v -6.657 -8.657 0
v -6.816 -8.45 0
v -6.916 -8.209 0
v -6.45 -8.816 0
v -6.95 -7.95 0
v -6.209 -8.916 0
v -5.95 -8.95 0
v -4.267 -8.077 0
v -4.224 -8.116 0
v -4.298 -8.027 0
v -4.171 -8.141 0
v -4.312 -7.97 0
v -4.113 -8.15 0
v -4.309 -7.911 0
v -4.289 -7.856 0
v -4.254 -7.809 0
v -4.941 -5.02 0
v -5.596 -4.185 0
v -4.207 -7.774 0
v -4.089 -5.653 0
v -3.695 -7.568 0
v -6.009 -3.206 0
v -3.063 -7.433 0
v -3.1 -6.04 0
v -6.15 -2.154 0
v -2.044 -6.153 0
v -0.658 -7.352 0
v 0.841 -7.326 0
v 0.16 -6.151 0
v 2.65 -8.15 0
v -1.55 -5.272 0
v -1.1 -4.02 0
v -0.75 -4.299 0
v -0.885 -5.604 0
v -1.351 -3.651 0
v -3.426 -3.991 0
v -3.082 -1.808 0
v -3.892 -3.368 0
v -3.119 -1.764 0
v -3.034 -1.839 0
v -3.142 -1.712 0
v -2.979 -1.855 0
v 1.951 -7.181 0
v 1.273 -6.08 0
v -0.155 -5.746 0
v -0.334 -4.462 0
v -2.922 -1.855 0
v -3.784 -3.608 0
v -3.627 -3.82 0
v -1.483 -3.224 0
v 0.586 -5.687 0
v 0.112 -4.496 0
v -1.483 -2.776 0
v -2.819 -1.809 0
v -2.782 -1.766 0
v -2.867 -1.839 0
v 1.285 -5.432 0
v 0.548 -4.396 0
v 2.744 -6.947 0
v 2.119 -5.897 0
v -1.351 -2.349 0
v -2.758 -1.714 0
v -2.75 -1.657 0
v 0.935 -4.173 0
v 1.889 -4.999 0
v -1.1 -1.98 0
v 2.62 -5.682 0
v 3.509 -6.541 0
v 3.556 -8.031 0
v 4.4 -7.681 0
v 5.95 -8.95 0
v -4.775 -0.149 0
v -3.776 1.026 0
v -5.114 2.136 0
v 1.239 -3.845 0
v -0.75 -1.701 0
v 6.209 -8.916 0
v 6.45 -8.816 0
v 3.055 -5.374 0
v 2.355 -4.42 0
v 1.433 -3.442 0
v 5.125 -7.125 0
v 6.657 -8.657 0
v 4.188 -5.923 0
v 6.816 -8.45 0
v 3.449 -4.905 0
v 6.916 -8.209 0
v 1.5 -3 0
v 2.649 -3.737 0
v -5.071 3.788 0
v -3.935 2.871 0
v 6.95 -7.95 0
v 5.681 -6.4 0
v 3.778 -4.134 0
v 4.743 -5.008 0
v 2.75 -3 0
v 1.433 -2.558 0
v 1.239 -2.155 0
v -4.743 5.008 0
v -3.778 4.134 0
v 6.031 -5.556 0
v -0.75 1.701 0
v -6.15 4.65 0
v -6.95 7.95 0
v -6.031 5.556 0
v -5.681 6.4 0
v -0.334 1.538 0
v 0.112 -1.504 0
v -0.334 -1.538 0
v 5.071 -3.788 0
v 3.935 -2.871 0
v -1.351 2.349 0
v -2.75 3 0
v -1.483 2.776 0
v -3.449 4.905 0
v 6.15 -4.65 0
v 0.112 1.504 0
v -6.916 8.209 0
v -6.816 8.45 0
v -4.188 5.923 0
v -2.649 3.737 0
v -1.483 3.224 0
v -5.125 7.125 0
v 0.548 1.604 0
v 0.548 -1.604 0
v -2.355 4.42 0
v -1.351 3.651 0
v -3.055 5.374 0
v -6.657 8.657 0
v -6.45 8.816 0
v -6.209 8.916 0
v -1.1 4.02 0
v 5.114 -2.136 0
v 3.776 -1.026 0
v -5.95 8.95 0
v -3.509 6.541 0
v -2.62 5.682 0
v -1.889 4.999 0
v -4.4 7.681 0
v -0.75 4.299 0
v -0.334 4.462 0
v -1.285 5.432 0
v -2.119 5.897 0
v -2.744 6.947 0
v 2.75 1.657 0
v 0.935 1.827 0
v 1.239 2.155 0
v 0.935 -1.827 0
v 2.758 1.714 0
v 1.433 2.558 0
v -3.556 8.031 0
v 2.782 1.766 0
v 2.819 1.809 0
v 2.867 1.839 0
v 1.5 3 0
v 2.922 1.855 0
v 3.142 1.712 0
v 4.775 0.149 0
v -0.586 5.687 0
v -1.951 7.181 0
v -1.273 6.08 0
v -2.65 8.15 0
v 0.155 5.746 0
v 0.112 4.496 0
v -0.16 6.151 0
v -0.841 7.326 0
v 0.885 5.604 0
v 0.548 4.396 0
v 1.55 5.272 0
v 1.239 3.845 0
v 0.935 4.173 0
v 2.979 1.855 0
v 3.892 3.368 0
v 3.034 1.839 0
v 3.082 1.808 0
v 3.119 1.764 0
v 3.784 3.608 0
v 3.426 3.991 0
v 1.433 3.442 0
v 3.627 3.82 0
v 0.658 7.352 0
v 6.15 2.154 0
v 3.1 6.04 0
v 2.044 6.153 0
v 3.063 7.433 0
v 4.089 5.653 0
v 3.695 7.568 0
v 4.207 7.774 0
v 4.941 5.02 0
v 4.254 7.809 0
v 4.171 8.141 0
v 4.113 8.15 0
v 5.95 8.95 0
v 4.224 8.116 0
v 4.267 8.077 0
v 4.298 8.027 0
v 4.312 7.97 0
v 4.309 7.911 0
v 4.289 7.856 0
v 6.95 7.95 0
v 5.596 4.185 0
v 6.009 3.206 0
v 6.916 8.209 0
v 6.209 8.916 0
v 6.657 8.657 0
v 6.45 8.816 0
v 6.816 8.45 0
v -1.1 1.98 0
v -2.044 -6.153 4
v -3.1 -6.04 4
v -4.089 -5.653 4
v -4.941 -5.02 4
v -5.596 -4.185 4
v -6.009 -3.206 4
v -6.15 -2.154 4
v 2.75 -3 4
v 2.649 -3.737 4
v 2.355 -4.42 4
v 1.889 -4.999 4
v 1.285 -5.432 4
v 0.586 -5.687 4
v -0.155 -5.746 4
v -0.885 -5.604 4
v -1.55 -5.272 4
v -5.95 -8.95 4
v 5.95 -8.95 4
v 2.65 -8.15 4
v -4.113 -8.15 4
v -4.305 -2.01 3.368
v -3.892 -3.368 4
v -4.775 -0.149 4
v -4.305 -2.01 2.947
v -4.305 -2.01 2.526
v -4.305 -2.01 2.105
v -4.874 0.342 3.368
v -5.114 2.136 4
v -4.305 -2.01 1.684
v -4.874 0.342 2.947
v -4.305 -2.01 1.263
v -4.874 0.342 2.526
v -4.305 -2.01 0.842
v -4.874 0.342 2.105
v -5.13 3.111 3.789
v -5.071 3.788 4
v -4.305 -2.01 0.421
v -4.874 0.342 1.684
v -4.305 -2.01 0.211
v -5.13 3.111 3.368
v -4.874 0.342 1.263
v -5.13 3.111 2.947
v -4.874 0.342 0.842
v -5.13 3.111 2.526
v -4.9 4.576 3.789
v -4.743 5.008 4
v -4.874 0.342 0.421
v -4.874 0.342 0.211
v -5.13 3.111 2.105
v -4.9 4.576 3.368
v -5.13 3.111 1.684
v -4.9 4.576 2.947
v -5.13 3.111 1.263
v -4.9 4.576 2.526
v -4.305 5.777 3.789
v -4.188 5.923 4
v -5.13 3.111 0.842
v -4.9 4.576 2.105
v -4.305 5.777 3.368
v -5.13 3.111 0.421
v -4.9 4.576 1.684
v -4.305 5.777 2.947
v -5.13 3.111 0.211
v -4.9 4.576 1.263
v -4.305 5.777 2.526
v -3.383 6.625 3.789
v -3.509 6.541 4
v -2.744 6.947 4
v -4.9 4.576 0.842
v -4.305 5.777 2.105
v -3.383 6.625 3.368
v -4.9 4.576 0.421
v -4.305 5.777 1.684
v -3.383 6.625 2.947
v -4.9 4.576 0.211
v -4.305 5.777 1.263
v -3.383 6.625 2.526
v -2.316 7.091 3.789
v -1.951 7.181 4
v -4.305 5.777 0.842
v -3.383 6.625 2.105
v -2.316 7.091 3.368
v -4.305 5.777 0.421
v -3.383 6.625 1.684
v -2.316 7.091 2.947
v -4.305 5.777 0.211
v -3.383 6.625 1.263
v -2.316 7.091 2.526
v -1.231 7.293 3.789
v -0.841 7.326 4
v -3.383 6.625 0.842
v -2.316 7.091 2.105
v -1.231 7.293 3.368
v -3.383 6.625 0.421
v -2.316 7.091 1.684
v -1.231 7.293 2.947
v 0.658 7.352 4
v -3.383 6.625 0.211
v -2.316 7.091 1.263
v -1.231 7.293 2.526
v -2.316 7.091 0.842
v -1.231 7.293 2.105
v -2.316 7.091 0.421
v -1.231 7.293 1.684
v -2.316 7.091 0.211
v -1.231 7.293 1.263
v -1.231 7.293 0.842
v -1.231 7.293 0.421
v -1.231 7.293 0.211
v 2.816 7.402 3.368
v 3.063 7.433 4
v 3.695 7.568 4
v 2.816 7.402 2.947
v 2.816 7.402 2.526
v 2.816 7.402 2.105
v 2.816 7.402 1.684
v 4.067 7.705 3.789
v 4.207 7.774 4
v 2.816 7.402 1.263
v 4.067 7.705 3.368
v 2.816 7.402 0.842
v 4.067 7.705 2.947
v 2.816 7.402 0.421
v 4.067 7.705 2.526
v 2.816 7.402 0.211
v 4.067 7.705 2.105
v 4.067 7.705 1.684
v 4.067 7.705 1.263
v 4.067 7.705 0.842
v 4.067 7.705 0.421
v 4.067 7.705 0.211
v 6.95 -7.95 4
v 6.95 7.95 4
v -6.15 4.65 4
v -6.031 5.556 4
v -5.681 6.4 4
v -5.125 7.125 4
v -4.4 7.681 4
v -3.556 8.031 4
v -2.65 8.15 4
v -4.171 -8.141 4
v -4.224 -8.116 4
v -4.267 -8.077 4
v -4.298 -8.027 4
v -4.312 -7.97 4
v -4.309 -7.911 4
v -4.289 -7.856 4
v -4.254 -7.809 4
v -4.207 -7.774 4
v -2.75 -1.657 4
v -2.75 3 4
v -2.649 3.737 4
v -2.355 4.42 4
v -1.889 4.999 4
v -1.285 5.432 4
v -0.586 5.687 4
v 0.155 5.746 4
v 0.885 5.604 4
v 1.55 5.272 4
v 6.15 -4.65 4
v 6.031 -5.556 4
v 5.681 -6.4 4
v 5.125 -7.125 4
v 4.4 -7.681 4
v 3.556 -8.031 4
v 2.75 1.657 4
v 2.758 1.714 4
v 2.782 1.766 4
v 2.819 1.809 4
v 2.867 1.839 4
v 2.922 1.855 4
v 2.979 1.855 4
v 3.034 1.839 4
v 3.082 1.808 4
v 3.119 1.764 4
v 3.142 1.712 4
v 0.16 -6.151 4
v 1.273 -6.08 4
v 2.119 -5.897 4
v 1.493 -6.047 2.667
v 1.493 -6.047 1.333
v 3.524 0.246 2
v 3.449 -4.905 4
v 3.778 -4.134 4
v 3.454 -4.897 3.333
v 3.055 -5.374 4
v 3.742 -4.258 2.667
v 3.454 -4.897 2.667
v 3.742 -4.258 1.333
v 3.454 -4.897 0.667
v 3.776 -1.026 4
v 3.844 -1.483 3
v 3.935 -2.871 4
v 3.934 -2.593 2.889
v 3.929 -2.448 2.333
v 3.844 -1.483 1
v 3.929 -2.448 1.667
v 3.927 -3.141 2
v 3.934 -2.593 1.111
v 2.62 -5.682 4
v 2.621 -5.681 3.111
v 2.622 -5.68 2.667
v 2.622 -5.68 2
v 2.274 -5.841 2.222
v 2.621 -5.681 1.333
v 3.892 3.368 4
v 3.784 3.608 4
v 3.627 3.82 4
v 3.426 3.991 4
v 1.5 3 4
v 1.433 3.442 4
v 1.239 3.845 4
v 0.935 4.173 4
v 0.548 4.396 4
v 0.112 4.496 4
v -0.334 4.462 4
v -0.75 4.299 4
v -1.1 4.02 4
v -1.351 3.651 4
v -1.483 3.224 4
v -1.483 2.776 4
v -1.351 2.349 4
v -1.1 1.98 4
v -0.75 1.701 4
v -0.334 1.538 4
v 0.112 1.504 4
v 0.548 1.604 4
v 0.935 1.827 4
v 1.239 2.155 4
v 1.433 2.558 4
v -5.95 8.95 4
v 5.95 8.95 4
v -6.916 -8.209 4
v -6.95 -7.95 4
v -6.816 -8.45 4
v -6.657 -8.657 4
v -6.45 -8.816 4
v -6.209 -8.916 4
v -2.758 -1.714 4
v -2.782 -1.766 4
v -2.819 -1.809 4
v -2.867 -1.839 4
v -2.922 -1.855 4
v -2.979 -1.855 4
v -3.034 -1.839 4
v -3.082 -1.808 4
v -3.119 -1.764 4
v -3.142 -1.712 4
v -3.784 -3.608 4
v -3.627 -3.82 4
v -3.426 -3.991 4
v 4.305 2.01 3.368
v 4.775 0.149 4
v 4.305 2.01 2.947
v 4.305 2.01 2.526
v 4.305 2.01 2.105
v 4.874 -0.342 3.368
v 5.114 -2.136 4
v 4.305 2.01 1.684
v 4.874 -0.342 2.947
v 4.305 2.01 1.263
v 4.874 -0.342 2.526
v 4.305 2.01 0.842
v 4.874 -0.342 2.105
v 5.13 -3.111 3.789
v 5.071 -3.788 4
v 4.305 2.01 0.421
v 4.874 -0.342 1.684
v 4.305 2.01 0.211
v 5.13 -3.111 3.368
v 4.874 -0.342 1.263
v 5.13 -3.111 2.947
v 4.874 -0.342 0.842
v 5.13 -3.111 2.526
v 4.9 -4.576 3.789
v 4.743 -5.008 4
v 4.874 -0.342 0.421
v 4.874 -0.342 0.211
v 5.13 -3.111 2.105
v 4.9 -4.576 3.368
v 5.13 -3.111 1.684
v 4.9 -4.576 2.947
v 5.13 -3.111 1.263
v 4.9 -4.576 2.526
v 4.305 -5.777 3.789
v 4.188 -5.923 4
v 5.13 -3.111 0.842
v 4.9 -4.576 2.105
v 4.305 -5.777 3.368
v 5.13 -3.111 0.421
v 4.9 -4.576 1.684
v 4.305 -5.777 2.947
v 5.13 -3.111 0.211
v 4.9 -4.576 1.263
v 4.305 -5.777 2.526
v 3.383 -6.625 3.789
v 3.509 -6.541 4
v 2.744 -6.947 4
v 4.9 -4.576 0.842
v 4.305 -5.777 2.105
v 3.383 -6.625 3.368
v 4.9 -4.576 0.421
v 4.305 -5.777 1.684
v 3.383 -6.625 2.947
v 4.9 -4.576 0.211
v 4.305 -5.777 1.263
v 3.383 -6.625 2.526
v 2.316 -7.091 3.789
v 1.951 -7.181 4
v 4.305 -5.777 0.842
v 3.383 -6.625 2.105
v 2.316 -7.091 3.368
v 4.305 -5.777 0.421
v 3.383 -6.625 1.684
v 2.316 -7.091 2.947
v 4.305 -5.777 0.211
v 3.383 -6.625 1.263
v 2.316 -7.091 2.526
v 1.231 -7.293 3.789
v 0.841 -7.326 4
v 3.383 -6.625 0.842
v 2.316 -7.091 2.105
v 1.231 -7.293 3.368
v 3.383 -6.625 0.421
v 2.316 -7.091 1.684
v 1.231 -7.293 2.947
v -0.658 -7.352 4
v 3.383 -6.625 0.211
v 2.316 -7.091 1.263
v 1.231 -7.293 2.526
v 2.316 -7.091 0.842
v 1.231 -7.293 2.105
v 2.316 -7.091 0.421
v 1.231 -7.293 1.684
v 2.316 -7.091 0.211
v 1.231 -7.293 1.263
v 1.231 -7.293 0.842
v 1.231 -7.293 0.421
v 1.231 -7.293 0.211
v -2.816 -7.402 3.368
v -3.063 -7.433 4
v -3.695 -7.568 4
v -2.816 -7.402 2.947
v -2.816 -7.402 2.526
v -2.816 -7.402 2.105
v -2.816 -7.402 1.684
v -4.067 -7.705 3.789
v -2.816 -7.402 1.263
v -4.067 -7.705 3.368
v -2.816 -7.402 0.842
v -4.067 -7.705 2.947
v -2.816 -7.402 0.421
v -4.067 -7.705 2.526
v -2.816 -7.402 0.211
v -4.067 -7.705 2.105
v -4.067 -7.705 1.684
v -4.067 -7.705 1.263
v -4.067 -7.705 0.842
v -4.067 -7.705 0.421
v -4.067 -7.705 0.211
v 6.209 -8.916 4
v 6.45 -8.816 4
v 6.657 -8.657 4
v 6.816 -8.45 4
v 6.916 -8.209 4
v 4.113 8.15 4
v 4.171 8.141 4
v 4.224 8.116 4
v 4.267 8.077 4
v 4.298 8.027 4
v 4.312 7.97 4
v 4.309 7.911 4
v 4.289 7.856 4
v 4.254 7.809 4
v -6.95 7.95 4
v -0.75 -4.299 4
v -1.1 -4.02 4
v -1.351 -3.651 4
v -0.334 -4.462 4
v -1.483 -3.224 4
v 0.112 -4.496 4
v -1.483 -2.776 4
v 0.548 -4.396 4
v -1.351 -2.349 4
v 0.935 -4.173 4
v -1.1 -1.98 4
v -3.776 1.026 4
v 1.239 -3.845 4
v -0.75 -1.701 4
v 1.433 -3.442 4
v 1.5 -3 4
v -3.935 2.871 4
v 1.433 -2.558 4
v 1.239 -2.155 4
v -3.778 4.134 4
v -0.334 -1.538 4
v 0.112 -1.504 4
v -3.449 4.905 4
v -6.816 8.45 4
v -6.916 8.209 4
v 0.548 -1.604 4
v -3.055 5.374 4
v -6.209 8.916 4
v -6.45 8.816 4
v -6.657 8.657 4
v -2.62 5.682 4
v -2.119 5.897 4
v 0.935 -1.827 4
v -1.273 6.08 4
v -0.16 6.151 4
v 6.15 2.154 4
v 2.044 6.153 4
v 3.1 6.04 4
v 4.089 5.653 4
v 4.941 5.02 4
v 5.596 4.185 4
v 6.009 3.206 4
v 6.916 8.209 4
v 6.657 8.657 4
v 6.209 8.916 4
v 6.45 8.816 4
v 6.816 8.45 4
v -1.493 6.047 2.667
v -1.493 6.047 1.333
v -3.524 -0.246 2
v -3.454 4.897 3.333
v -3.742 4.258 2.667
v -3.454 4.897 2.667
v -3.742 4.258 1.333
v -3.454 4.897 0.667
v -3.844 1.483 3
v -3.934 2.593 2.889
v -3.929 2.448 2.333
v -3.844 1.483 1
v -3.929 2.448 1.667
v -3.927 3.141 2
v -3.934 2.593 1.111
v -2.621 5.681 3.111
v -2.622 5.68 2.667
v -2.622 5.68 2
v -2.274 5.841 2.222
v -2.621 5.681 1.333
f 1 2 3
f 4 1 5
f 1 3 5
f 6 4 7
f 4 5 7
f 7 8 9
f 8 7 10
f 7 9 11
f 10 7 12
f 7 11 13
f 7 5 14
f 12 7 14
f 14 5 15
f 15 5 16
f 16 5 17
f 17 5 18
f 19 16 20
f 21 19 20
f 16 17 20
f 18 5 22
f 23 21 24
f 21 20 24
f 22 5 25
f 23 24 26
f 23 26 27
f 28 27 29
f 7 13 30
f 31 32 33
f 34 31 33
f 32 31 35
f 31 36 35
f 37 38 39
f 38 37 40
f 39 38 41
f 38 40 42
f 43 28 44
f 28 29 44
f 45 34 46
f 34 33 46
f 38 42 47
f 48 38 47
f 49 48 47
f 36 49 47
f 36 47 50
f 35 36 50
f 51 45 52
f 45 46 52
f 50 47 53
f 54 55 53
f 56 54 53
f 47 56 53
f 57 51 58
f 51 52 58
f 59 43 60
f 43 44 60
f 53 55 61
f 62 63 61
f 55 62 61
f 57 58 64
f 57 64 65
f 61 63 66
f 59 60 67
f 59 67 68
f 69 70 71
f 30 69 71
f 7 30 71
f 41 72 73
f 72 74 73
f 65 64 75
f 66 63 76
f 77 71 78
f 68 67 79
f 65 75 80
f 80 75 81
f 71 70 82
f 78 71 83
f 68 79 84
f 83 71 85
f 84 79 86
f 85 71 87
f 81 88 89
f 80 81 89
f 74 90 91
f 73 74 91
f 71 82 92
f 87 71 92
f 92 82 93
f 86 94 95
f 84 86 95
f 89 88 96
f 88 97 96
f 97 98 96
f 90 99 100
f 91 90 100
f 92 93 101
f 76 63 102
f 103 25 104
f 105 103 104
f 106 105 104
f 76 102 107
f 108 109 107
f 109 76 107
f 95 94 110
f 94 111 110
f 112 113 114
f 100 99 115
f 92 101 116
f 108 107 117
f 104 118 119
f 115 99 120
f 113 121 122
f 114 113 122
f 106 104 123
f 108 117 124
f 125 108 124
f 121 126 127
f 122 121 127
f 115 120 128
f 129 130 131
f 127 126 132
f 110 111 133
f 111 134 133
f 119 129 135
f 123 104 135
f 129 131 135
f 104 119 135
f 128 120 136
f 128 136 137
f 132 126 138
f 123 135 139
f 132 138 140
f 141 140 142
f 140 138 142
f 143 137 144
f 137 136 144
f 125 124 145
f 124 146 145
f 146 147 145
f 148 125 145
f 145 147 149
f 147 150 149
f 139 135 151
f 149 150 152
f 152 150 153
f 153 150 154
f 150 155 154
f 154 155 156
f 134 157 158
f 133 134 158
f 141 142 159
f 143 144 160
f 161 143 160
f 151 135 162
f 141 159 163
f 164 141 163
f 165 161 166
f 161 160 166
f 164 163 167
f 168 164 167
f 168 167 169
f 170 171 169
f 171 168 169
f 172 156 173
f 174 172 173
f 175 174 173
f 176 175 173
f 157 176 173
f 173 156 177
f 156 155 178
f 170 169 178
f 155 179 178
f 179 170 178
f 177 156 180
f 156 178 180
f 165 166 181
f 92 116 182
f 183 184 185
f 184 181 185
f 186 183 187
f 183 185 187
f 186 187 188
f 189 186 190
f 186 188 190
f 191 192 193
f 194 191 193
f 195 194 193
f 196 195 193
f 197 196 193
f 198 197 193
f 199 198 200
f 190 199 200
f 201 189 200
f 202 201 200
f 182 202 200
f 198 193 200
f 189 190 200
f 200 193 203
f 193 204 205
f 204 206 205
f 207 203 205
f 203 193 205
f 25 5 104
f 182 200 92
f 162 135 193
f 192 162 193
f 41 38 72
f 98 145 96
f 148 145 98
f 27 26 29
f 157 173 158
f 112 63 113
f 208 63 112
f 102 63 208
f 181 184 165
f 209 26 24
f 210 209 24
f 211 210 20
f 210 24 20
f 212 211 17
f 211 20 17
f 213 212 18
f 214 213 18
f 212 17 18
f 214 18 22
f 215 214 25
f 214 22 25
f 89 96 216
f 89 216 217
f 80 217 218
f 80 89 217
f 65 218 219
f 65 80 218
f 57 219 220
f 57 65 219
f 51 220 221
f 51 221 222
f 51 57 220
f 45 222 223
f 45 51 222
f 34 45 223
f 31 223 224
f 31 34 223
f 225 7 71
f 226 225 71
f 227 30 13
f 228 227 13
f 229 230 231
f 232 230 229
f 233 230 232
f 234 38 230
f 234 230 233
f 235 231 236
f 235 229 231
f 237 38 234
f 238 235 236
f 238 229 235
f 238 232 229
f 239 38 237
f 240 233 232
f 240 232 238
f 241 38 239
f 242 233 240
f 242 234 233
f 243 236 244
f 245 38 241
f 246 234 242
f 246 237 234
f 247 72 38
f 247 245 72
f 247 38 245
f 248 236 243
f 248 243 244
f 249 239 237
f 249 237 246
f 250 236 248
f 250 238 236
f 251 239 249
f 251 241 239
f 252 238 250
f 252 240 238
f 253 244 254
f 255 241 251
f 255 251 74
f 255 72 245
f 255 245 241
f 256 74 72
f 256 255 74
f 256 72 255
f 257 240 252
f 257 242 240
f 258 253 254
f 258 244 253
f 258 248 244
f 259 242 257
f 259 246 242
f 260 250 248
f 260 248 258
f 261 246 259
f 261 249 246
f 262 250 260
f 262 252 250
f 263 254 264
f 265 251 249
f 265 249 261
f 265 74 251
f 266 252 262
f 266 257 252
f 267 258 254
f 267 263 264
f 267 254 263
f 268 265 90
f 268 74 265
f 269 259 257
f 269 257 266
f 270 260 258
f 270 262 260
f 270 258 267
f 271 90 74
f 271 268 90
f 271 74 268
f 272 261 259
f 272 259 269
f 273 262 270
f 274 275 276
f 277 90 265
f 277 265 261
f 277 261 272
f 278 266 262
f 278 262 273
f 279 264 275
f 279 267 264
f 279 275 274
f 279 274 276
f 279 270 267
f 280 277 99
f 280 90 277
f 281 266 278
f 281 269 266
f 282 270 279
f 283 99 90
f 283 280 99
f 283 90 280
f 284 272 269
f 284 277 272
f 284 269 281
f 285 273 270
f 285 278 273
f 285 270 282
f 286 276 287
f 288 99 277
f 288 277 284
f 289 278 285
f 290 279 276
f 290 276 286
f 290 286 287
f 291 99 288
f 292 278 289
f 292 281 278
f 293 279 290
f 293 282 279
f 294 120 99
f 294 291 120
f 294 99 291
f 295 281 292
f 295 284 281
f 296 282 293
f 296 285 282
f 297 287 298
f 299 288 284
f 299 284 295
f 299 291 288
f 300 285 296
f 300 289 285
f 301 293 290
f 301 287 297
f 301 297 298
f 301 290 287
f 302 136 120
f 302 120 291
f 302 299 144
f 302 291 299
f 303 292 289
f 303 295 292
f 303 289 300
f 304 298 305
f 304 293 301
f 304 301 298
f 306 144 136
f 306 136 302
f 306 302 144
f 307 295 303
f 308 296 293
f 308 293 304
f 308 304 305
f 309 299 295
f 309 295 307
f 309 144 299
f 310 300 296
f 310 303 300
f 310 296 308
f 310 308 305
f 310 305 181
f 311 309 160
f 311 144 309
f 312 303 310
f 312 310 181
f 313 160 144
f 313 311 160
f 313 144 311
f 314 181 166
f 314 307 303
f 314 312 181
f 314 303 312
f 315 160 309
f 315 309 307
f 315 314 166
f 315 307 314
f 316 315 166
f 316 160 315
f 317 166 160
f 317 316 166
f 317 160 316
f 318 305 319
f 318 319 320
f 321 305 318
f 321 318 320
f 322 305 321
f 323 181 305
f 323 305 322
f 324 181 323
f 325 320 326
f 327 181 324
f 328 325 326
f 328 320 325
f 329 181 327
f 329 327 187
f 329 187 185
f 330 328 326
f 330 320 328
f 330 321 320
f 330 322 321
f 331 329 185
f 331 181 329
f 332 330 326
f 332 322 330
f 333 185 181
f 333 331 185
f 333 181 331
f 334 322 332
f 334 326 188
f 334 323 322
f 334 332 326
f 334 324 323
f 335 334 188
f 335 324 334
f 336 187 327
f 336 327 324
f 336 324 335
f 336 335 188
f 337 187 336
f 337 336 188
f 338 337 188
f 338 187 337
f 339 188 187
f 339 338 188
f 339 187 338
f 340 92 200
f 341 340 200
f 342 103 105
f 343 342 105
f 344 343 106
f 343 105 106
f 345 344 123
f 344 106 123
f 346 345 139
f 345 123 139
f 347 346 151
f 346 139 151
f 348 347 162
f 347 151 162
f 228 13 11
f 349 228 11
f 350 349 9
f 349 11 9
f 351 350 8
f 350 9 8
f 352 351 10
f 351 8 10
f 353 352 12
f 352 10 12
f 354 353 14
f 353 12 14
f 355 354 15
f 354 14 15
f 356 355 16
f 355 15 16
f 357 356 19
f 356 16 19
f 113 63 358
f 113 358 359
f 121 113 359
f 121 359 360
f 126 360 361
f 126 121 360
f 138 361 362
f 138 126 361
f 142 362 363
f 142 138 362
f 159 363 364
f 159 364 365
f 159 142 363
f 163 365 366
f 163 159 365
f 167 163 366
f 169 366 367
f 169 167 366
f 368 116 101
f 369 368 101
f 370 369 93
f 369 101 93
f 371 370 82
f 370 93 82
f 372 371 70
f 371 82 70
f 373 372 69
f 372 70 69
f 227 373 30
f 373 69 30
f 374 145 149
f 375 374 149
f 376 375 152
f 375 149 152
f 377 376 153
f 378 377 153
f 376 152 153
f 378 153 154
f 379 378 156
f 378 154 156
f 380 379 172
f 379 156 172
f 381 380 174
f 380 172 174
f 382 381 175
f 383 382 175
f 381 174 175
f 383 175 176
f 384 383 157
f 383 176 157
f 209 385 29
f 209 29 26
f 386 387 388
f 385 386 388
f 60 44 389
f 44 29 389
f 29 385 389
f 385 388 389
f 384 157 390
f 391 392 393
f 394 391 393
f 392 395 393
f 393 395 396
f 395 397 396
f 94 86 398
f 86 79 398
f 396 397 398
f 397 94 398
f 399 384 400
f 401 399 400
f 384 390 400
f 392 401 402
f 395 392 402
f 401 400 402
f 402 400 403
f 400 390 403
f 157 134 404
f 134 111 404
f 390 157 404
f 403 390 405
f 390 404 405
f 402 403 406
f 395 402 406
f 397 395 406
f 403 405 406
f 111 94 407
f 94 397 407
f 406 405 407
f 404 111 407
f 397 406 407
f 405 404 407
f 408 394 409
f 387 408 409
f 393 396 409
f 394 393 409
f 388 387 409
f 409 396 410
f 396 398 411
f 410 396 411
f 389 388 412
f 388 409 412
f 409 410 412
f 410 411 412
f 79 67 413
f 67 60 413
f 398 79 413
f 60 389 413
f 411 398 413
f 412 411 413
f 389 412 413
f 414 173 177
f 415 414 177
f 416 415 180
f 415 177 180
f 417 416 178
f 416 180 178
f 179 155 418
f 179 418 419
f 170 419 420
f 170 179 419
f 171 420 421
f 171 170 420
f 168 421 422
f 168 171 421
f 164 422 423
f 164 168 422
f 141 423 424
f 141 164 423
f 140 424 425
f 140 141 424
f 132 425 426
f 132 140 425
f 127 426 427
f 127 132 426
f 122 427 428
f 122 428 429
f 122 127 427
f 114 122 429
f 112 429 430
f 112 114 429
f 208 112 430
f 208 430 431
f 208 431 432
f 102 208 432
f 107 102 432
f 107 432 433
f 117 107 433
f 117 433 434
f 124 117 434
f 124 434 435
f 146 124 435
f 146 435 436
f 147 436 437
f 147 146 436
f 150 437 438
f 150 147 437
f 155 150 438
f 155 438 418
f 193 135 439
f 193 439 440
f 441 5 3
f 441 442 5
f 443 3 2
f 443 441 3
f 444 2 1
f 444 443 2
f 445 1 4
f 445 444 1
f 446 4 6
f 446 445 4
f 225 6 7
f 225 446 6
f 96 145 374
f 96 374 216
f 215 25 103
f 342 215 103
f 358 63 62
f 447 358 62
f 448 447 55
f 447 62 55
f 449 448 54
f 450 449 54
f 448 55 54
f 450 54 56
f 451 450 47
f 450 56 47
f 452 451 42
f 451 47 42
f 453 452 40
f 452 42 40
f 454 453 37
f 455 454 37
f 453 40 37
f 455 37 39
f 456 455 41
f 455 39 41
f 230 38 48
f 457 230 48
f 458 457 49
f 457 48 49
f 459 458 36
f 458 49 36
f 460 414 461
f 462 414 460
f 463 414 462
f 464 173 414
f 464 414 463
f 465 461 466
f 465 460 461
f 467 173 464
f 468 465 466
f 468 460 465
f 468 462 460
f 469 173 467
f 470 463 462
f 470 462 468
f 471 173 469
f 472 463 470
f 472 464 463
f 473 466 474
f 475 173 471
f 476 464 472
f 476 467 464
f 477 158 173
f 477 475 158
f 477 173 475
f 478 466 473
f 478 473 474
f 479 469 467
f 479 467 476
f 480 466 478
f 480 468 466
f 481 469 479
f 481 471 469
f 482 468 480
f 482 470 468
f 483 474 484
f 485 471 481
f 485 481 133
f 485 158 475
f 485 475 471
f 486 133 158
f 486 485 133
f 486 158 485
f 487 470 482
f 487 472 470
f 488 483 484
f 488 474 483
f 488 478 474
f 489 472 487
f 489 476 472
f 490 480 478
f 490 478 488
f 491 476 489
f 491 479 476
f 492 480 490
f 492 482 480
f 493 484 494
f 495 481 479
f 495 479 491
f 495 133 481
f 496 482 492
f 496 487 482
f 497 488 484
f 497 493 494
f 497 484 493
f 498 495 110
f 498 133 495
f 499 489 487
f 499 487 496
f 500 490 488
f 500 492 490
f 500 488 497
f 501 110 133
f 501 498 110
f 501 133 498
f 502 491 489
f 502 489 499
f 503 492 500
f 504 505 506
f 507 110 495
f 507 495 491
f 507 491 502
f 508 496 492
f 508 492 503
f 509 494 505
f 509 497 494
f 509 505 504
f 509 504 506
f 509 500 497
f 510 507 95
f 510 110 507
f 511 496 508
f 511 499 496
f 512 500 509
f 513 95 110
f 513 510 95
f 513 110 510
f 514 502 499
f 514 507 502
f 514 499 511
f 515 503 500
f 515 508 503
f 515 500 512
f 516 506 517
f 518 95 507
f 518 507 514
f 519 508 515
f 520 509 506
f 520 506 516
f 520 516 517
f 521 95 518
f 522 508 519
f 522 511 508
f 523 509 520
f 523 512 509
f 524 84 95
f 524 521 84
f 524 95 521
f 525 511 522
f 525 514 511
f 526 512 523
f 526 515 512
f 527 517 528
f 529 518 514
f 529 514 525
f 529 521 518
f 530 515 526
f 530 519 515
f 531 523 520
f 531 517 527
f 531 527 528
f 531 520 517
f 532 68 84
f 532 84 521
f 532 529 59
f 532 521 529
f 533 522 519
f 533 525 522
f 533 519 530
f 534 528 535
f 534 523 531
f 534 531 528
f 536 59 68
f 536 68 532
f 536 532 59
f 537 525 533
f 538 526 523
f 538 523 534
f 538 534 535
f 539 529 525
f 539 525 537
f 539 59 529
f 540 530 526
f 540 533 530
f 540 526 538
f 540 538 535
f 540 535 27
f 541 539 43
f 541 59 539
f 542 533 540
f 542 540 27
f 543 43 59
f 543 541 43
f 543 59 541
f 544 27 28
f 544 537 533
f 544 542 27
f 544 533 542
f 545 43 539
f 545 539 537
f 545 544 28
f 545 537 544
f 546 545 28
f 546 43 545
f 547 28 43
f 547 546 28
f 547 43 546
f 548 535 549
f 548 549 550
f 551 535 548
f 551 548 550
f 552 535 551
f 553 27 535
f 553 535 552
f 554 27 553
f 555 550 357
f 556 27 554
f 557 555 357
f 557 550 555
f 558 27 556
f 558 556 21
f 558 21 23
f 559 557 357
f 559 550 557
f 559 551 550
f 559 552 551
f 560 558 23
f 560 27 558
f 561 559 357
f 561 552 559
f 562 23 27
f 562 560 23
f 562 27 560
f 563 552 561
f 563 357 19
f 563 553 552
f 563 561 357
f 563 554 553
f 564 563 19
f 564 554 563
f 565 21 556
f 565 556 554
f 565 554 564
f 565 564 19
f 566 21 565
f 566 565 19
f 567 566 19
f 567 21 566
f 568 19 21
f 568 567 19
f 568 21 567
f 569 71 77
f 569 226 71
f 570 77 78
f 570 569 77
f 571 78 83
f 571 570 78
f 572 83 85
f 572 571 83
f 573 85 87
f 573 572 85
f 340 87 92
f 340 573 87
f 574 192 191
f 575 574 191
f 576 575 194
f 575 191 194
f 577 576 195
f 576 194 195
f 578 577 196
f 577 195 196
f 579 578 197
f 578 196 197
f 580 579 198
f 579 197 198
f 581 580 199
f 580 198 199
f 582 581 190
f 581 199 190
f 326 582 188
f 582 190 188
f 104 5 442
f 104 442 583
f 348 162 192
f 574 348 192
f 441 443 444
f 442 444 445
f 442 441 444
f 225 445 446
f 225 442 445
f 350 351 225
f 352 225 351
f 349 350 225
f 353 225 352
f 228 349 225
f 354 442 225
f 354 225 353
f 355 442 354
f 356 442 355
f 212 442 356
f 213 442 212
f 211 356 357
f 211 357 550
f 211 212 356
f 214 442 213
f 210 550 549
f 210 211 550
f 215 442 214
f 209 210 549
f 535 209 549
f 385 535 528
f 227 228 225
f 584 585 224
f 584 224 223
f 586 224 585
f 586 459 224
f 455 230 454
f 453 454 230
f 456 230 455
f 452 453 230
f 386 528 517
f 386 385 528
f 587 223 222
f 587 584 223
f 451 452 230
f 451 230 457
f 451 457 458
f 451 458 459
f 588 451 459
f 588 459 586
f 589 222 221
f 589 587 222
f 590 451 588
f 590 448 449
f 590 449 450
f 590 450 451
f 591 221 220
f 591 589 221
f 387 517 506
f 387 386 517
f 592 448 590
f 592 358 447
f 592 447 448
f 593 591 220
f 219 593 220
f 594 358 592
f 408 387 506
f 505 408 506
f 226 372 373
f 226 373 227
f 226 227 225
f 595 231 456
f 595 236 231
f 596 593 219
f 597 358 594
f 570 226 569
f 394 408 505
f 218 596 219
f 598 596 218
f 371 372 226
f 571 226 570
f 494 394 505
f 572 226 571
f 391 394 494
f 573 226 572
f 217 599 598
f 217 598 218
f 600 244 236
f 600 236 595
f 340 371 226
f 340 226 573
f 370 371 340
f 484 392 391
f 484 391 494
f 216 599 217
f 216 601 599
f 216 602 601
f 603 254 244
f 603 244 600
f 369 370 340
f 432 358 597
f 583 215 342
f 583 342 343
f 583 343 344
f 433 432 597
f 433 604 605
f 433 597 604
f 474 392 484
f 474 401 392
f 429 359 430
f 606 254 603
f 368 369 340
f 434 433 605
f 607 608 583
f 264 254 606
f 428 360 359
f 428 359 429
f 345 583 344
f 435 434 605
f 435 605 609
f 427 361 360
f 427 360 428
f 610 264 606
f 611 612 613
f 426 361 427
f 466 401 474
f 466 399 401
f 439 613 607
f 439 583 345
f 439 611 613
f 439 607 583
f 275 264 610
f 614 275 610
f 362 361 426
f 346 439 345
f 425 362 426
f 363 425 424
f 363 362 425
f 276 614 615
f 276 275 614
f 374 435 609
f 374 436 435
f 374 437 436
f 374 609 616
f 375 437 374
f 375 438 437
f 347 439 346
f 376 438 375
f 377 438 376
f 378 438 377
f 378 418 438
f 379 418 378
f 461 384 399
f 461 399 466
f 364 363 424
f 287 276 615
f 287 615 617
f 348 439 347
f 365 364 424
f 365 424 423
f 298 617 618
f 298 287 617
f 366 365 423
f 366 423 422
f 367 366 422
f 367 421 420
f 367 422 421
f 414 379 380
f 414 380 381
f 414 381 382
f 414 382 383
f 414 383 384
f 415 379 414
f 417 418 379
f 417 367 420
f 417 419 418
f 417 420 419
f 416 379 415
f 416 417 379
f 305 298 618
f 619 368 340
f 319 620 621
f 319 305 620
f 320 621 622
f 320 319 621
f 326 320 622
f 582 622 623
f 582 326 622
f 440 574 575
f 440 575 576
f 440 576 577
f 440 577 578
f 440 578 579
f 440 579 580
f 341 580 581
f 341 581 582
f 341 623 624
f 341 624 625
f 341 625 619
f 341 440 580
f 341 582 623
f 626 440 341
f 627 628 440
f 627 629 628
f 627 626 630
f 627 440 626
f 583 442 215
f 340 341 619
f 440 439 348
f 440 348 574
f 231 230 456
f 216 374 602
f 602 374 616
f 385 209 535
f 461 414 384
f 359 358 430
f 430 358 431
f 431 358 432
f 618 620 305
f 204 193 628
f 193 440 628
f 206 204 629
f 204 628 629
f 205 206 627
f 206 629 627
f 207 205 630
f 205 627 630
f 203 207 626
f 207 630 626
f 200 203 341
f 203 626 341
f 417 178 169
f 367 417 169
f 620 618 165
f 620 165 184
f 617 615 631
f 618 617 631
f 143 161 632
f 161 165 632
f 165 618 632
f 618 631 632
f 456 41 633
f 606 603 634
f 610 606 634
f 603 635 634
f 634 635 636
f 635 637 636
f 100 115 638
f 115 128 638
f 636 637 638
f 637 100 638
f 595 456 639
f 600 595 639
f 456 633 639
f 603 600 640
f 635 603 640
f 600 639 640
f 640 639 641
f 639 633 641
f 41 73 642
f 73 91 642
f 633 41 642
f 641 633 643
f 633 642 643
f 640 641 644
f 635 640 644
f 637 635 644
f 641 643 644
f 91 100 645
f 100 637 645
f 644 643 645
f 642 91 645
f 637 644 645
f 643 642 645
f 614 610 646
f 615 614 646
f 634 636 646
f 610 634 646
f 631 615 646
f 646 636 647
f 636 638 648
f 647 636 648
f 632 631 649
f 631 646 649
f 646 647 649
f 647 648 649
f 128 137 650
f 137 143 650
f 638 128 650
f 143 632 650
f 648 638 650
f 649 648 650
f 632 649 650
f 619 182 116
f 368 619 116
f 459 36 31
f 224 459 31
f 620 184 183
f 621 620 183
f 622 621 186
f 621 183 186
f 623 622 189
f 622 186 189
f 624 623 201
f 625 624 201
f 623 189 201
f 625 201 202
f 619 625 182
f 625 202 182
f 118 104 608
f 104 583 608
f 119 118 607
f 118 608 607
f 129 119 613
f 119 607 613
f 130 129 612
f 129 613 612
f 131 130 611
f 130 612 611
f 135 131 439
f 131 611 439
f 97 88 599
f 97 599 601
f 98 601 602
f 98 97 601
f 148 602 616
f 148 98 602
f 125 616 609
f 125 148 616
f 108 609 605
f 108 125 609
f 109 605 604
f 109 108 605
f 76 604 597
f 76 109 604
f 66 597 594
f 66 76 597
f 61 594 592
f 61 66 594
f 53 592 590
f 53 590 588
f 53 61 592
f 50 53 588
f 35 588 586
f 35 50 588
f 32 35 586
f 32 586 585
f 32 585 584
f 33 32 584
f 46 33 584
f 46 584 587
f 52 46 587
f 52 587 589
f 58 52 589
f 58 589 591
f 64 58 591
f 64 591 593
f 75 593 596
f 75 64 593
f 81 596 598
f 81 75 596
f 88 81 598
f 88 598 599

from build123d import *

# Parameters (mm, degrees)
SKETCH1_R           = 1.5
BOSS_EXTRUDE1_DEPTH = 4
SKETCH3_W           = 13.9
SKETCH3_H           = 17.9
BOSS_EXTRUDE2_DEPTH = 4
FILLET1_R           = 1


with BuildPart() as part:
    # Sketch1 → Boss-Extrude1 (new body)
    with BuildSketch(Plane.XY):
        with BuildLine():
            Line((2.75, 3), (2.75, -3))
            ThreePointArc((2.75, -3), (0, -5.75), (-2.75, -3))
            Line((-2.75, -3), (-2.75, 3))
            ThreePointArc((-2.75, 3), (0, 5.75), (2.75, 3))
        make_face()
        with Locations((0, 3)):
            Circle(SKETCH1_R, mode=Mode.SUBTRACT)
        with Locations((0, -3)):
            Circle(SKETCH1_R, mode=Mode.SUBTRACT)
    extrude(amount=BOSS_EXTRUDE1_DEPTH)

    # Sketch3 → Boss-Extrude2 (add)
    # profile 1 of 9: a face of its own
    with BuildSketch(Plane.XY):
        Rectangle(SKETCH3_W, SKETCH3_H)
        with BuildLine():
            ThreePointArc((-6.15, 4.65), (-5.124873734, 7.124873734), (-2.65, 8.15))
            Line((-2.65, 8.15), (4.112856791, 8.15))
            Line((4.112856791, 8.15), (4.706051065, 8.15))
            Line((4.706051065, 8.15), (6.15, 8.15))
            Line((6.15, 8.15), (6.15, 2.154161758))
            Line((6.15, 2.154161758), (6.15, -4.65))
            ThreePointArc((6.15, -4.65), (5.124873734, -7.124873734), (2.65, -8.15))
            Line((2.65, -8.15), (-4.112856791, -8.15))
            Line((-4.112856791, -8.15), (-4.706051065, -8.15))
            Line((-4.706051065, -8.15), (-6.15, -8.15))
            Line((-6.15, -8.15), (-6.15, -2.154161758))
            Line((-6.15, -2.154161758), (-6.15, 4.65))
        make_face(mode=Mode.SUBTRACT)
    # profile 2 of 9: a face of its own
    with BuildSketch(Plane.XY):
        with BuildLine():
            ThreePointArc((-2.75, -1.657276465), (-2.922233335, -1.855339617), (-3.142290123, -1.712271998))
            add(Edge.make_bspline(
                [(-2.75, -3), (-2.895116066, -2.548968307), (-3.025653874, -2.120086915), (-3.142290123, -1.712271998)],
                knots=[0, 0, 0, 0, 0.03046246, 0.03046246, 0.03046246, 0.03046246], degree=3))
            Line((-2.75, -3), (-2.75, -1.657276465))
        make_face()
    # profile 3 of 9: a face of its own
    with BuildSketch(Plane.XY):
        with BuildLine():
            ThreePointArc((2.75, 1.657276465), (2.922233335, 1.855339617), (3.142290123, 1.712271998))
            add(Edge.make_bspline(
                [(2.75, 3), (2.895116066, 2.548968307), (3.025653874, 2.120086915), (3.142290123, 1.712271998)],
                knots=[0, 0, 0, 0, 0.03046246, 0.03046246, 0.03046246, 0.03046246], degree=3))
            Line((2.75, 3), (2.75, 1.657276465))
        make_face()
    # profile 4 of 9: a face of its own
    with BuildSketch(Plane.XY):
        with BuildLine():
            add(Edge.make_bspline(
                [(-2.04403215, -6.152757863), (-3.725432845, -6.197317106), (-5.32078534, -6.499978045), (-6.15, -8.15)],
                knots=[0.694867205, 0.694867205, 0.694867205, 0.694867205, 1, 1, 1, 1], degree=3))
            Line((-6.15, -8.15), (-4.706051065, -8.15))
            add(Edge.make_bspline(
                [(-4.207167317, -7.773632416), (-4.252078901, -7.797648366), (-4.35473853, -7.857185348), (-4.503870008, -7.961266958), (-4.622893022, -8.065250612), (-4.688673957, -8.131740554), (-4.706051065, -8.15)],
                knots=[0.873569037, 0.873569037, 0.873569037, 0.873569037, 0.889194037, 0.910606982, 0.932019927, 0.939832427, 0.939832427, 0.939832427, 0.939832427], degree=3))
            add(Edge.make_bspline(
                [(3.892329753, 3.367536033), (3.966691683, 3.136413539), (4.114564902, 2.664320103), (4.373566525, 1.785097119), (4.645385903, 0.756379468), (4.887449448, -0.359638934), (5.104052776, -1.708671801), (5.181502836, -3.15853137), (4.962795165, -4.614749004), (4.365786787, -5.837691524), (3.403362237, -6.694112805), (2.315936187, -7.134159929), (0.867591801, -7.375395149), (-0.923730528, -7.344095734), (-2.573627433, -7.340372841), (-3.558390207, -7.511577042), (-3.980456832, -7.660053684), (-4.162255733, -7.749616466), (-4.207167317, -7.773632416)],
                knots=[0, 0, 0, 0, 0.015625, 0.03125, 0.0625, 0.09375, 0.125, 0.1875, 0.25, 0.3125, 0.375, 0.4375, 0.5, 0.625, 0.75, 0.8125, 0.857944037, 0.873569037, 0.873569037, 0.873569037, 0.873569037], degree=3))
            ThreePointArc((3.892329753, 3.367536033), (3.711332001, 3.718220568), (3.426363636, 3.991227639))
            Line((3.426363636, 3.991227639), (1.55, 5.271563338))
            ThreePointArc((1.55, 5.271563338), (2.431563283, 4.284523258), (2.75, 3))
            add(Edge.make_bspline(
                [(2.75, 3), (2.895116066, 2.548968307), (3.025653874, 2.120086915), (3.142290123, 1.712271998)],
                knots=[0, 0, 0, 0, 0.03046246, 0.03046246, 0.03046246, 0.03046246], degree=3))
            add(Edge.make_bspline(
                [(3.142290123, 1.712271998), (5.686197488, -7.182418828), (1.61709709, -6.055733312), (-2.04403215, -6.152757863)],
                knots=[0.03046246, 0.03046246, 0.03046246, 0.03046246, 0.694867205, 0.694867205, 0.694867205, 0.694867205], degree=3))
        make_face()
    # profile 5 of 9: a face of its own
    with BuildSketch(Plane.XY):
        with BuildLine():
            Line((6.15, 2.154161758), (6.15, 8.15))
            add(Edge.make_bspline(
                [(2.04403215, 6.152757863), (3.725432845, 6.197317106), (5.32078534, 6.499978045), (6.15, 8.15)],
                knots=[0.694867205, 0.694867205, 0.694867205, 0.694867205, 1, 1, 1, 1], degree=3))
            ThreePointArc((2.04403215, 6.152757863), (4.940710358, 5.019809276), (6.15, 2.154161758))
        make_face()
    # profile 6 of 9: a face of its own
    with BuildSketch(Plane.XY):
        with BuildLine():
            ThreePointArc((-2.04403215, -6.152757863), (-4.940710358, -5.019809276), (-6.15, -2.154161758))
            Line((-6.15, -2.154161758), (-6.15, -8.15))
            add(Edge.make_bspline(
                [(-2.04403215, -6.152757863), (-3.725432845, -6.197317106), (-5.32078534, -6.499978045), (-6.15, -8.15)],
                knots=[0.694867205, 0.694867205, 0.694867205, 0.694867205, 1, 1, 1, 1], degree=3))
        make_face()
    # profile 7 of 9: a face of its own
    with BuildSketch(Plane.XY):
        with BuildLine():
            Line((6.15, 8.15), (4.706051065, 8.15))
            add(Edge.make_bspline(
                [(4.207167317, 7.773632416), (4.252078901, 7.797648366), (4.35473853, 7.857185348), (4.503870008, 7.961266958), (4.622893022, 8.065250612), (4.688673957, 8.131740554), (4.706051065, 8.15)],
                knots=[0.873569037, 0.873569037, 0.873569037, 0.873569037, 0.889194037, 0.910606982, 0.932019927, 0.939832427, 0.939832427, 0.939832427, 0.939832427], degree=3))
            add(Edge.make_bspline(
                [(-3.892329753, -3.367536033), (-3.966691683, -3.136413539), (-4.114564902, -2.664320103), (-4.373566525, -1.785097119), (-4.645385903, -0.756379468), (-4.887449448, 0.359638934), (-5.104052776, 1.708671801), (-5.181502836, 3.15853137), (-4.962795165, 4.614749004), (-4.365786787, 5.837691524), (-3.403362237, 6.694112805), (-2.315936187, 7.134159929), (-0.867591801, 7.375395149), (0.923730528, 7.344095734), (2.573627433, 7.340372841), (3.558390207, 7.511577042), (3.980456832, 7.660053684), (4.162255733, 7.749616466), (4.207167317, 7.773632416)],
                knots=[0, 0, 0, 0, 0.015625, 0.03125, 0.0625, 0.09375, 0.125, 0.1875, 0.25, 0.3125, 0.375, 0.4375, 0.5, 0.625, 0.75, 0.8125, 0.857944037, 0.873569037, 0.873569037, 0.873569037, 0.873569037], degree=3))
            ThreePointArc((-3.892329753, -3.367536033), (-3.711332001, -3.718220568), (-3.426363636, -3.991227639))
            Line((-3.426363636, -3.991227639), (-1.55, -5.271563338))
            ThreePointArc((-1.55, -5.271563338), (-2.431563283, -4.284523258), (-2.75, -3))
            add(Edge.make_bspline(
                [(-2.75, -3), (-2.895116066, -2.548968307), (-3.025653874, -2.120086915), (-3.142290123, -1.712271998)],
                knots=[0, 0, 0, 0, 0.03046246, 0.03046246, 0.03046246, 0.03046246], degree=3))
            add(Edge.make_bspline(
                [(-3.142290123, -1.712271998), (-5.686197488, 7.182418828), (-1.61709709, 6.055733312), (2.04403215, 6.152757863)],
                knots=[0.03046246, 0.03046246, 0.03046246, 0.03046246, 0.694867205, 0.694867205, 0.694867205, 0.694867205], degree=3))
            add(Edge.make_bspline(
                [(2.04403215, 6.152757863), (3.725432845, 6.197317106), (5.32078534, 6.499978045), (6.15, 8.15)],
                knots=[0.694867205, 0.694867205, 0.694867205, 0.694867205, 1, 1, 1, 1], degree=3))
        make_face()
    # profile 8 of 9: a face of its own
    with BuildSketch(Plane.XY):
        with BuildLine():
            ThreePointArc((4.112856791, 8.15), (4.306858746, 7.998613183), (4.207167317, 7.773632416))
            add(Edge.make_bspline(
                [(4.207167317, 7.773632416), (4.252078901, 7.797648366), (4.35473853, 7.857185348), (4.503870008, 7.961266958), (4.622893022, 8.065250612), (4.688673957, 8.131740554), (4.706051065, 8.15)],
                knots=[0.873569037, 0.873569037, 0.873569037, 0.873569037, 0.889194037, 0.910606982, 0.932019927, 0.939832427, 0.939832427, 0.939832427, 0.939832427], degree=3))
            Line((4.706051065, 8.15), (4.112856791, 8.15))
        make_face()
    # profile 9 of 9: a face of its own
    with BuildSketch(Plane.XY):
        with BuildLine():
            ThreePointArc((-4.112856791, -8.15), (-4.306858746, -7.998613183), (-4.207167317, -7.773632416))
            add(Edge.make_bspline(
                [(-4.207167317, -7.773632416), (-4.252078901, -7.797648366), (-4.35473853, -7.857185348), (-4.503870008, -7.961266958), (-4.622893022, -8.065250612), (-4.688673957, -8.131740554), (-4.706051065, -8.15)],
                knots=[0.873569037, 0.873569037, 0.873569037, 0.873569037, 0.889194037, 0.910606982, 0.932019927, 0.939832427, 0.939832427, 0.939832427, 0.939832427], degree=3))
            Line((-4.706051065, -8.15), (-4.112856791, -8.15))
        make_face()
    extrude(amount=BOSS_EXTRUDE2_DEPTH)

    # Fillet1
    fillet1_edges = [part.edges().sort_by_distance(p)[0] for p in [
        (6.95, 8.95, 2),
        (-6.95, 8.95, 2),
        (-6.95, -8.95, 2),
        (6.95, -8.95, 2),
    ]]
    fillet(fillet1_edges, radius=FILLET1_R)


solid = part.part
